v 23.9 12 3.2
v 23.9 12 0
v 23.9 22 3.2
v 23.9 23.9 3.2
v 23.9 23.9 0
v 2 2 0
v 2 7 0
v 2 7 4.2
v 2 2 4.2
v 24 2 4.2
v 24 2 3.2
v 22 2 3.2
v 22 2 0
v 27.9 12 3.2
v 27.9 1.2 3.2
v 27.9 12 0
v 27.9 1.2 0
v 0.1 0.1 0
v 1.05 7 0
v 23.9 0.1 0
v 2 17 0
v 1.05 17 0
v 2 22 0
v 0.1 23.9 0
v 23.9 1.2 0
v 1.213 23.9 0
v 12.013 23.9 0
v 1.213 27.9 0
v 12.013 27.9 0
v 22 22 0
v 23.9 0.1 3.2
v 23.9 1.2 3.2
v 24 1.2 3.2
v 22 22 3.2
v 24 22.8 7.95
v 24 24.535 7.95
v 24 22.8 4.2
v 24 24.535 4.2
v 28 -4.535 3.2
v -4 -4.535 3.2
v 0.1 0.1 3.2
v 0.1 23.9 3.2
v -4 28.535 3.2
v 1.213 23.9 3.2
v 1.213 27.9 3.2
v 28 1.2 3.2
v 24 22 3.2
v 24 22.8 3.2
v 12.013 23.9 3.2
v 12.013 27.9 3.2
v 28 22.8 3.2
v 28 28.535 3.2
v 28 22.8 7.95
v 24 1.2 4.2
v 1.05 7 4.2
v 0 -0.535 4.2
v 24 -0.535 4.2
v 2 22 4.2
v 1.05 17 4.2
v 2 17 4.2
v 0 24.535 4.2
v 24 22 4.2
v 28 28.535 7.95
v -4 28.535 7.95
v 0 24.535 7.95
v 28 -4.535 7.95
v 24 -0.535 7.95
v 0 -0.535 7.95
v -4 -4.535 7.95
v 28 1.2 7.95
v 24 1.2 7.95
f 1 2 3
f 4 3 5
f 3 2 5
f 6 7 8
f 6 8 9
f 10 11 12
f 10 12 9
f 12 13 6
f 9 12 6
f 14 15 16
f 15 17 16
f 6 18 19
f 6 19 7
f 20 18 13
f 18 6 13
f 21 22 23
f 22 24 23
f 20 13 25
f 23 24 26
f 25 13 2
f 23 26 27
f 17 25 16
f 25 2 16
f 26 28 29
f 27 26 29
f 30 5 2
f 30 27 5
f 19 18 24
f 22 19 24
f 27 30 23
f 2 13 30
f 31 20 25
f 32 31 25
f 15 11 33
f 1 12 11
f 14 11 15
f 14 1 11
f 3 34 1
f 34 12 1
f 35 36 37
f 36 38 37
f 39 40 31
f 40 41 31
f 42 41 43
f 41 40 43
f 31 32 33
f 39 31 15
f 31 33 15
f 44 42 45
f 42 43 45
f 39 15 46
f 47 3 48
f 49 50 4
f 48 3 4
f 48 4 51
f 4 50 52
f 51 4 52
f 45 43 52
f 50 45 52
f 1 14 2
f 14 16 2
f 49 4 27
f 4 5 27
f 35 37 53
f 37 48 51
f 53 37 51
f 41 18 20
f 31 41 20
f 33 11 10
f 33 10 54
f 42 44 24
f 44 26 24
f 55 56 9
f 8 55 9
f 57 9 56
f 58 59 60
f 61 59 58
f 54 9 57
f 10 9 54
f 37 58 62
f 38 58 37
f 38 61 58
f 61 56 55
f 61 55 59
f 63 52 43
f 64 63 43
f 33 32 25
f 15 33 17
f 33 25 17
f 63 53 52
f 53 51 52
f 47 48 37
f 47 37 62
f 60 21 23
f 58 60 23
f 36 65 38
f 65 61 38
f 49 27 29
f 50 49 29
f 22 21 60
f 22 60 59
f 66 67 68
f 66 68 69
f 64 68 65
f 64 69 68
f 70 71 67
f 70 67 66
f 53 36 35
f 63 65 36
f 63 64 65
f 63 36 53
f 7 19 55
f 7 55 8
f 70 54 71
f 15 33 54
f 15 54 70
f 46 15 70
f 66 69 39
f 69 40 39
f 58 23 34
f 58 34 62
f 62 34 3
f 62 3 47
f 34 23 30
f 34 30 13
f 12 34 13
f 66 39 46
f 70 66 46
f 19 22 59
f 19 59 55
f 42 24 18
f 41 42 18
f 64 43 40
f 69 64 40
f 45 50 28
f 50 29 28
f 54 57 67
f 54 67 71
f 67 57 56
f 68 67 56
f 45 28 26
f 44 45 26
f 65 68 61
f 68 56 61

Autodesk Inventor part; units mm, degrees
ref_plane "YZ Plane" through (0, 0, 0) normal (1, 0, 0) x (0, 1, 0)
ref_plane "XZ Plane" through (0, 0, 0) normal (0, 1, 0) x (-1, 0, 0)
ref_plane "XY Plane" through (0, 0, 0) normal (0, 0, 1) x (1, 0, 0)
sketch "Sketch1" plane through (0, 0, 0) normal (0, 0, 1) x (1, 0, 0)
  line L0 (0, 0) -> (0, 24) construction
  line L1 (0, 24) -> (1.113, 24) construction
  line L2 (1.113, 24) -> (1.113, 28) construction
  line L3 (1.113, 28) -> (12.113, 28) construction
  line L4 (12.113, 28) -> (12.113, 24) construction
  line L5 (12.113, 24) -> (24, 24) construction
  line L6 (24, 24) -> (24, 12.1) construction
  line L7 (24, 12.1) -> (28, 12.1) construction
  line L8 (28, 12.1) -> (28, 1.1) construction
  line L9 (28, 1.1) -> (24, 1.1) construction
  line L10 (24, 1.1) -> (24, 0) construction
  line L11 (24, 0) -> (0, 0) construction
  line L12 (12.013, 27.9) -> (1.213, 27.9)
  line L13 (1.213, 27.9) -> (1.213, 23.9)
  line L14 (1.213, 23.9) -> (0.1, 23.9)
  line L15 (0.1, 23.9) -> (0.1, 0.1)
  line L16 (0.1, 0.1) -> (23.9, 0.1)
  line L17 (23.9, 0.1) -> (23.9, 1.2)
  line L18 (23.9, 1.2) -> (27.9, 1.2)
  line L19 (27.9, 1.2) -> (27.9, 12)
  line L20 (27.9, 12) -> (23.9, 12)
  line L21 (23.9, 12) -> (23.9, 23.9)
  line L22 (23.9, 23.9) -> (12.013, 23.9)
  line L23 (12.013, 23.9) -> (12.013, 27.9)
  circle A0 centre (-1.945, 26.005) radius 1.548
  circle A1 centre (26.025, 26.005) radius 1.548
  circle A2 centre (-2.025, -2.005) radius 1.548
  circle A3 centre (26.025, -2.005) radius 1.548
  line L24 (0.1, 23.9) -> (23.9, 0.1) construction
  line L25 (23.9, 23.9) -> (0.1, 0.1) construction
  line L26 (-1.945, 26.005) -> (26.025, -2.005) construction
  line L27 (-2.025, -2.005) -> (26.025, 26.005) construction
  line L28 (2, 22) -> (22, 22)
  line L29 (22, 22) -> (22, 2)
  line L30 (22, 2) -> (2, 2)
  line L31 (2, 2) -> (2, 22) construction
  line L32 (2, 17) -> (1.05, 17)
  line L33 (1.05, 17) -> (1.05, 7)
  line L34 (1.05, 7) -> (2, 7)
  line L35 (2, 17) -> (2, 22)
  line L36 (2, 7) -> (2, 2)
  point P0 (12, 12)
  point P1 (1.05, 12)
  point P2 (12, 12)
  dimension "d0" = 24
  dimension "d1" = 1.113
  dimension "d2" = 4
  dimension "d3" = 11
  dimension "d4" = 11.887
  dimension "d5" = 11.9
  dimension "d6" = 4
  dimension "d7" = 11
  dimension "d8" = 1.1
  dimension "d9" = 0.1
  dimension "d10" = 3.096
  dimension "d11" = 27.97
  dimension "d12" = 28.01
  dimension "d15" = 20
  dimension "d16" = 0.95
  dimension "d17" = 10
extrude "Extrusion1" add sketch "Sketch1" along normal blind 3.2 contours L23 L22 L21 L20 L19 L18 L17 L16 L15 L14 L13 L12
sketch "Sketch2" plane through (0, 0, 3.2) normal (0, 0, 1) x (1, 0, 0)
  line L0 (0, 24.535) -> (24, 24.535)
  line L1 (24, 24.535) -> (24, -0.535) construction
  line L2 (24, -0.535) -> (0, -0.535)
  line L3 (0, -0.535) -> (0, 24.535)
  line L4 (22, 22) -> (22, 2) projected
  line L5 (1.3564, 23.1456) -> (22, 2) construction
  line L6 (22, 22) -> (2.0347, 2) construction
  line L7 (2, 22) -> (22, 22) projected
  line L8 (28, 28.535) -> (-4, 28.535)
  line L9 (-4, 28.535) -> (-4, -4.535)
  line L10 (-4, -4.535) -> (28, -4.535)
  line L11 (28, -4.535) -> (28, 28.535)
  line L12 (24, 1.2) -> (28, 1.2)
  line L13 (24, 22.8) -> (28, 22.8)
  line L14 (24, 24.535) -> (24, 22.8)
  line L15 (24, -0.535) -> (24, 1.2)
  line L16 (23.9, 0.1) -> (23.9, 1.2) projected
  point P0 (0, 0)
  point P1 (12, 24.535)
  point P2 (12, 22)
  point P3 (24, 12)
  point P4 (22, 12)
  dimension "d18" = 25.07
  dimension "d19" = 24
  dimension "d20" = 4
  dimension "d21" = 1.735
  dimension "d22" = 1.735
extrude "Extrusion2" add sketch "Sketch2" along normal blind 4.75 contours L3 L2 L15 L12 L11 L10 L9 L8 L13 L14 L0
sketch "Sketch3" plane through (0, 0, 3.2) normal (0, 0, 1) x (1, 0, 0)
  line L0 (28, 1.2) -> (24, 1.2) projected
  line L1 (24, 1.2) -> (24, -0.535) projected
  line L2 (24, -0.535) -> (0, -0.535) projected
  line L3 (0, -0.535) -> (0, 24.535) projected
  line L4 (0, 24.535) -> (24, 24.535) projected
  line L5 (24, 24.535) -> (24, 22.8) projected
  line L6 (24, 22.8) -> (28, 22.8) projected
  line L7 (28, 22.8) -> (28, 28.535) projected
  line L8 (28, 28.535) -> (-4, 28.535) projected
  line L9 (-4, 28.535) -> (-4, -4.535) projected
  line L10 (-4, -4.535) -> (28, -4.535) projected
  line L11 (28, -4.535) -> (28, 1.2) projected
  line L12 (12.013, 24.535) -> (1.213, 24.535) projected
  line L13 (1.213, 24.535) -> (1.213, 23.9) projected
  line L14 (1.213, 23.9) -> (0.1, 23.9) projected
  line L15 (0.1, 23.9) -> (0.1, 0.1) projected
  line L16 (0.1, 0.1) -> (23.9, 0.1) projected
  line L17 (23.9, 0.1) -> (23.9, 1.2) projected
  line L18 (23.9, 1.2) -> (24, 1.2) projected
  line L19 (24, 1.2) -> (27.9, 1.2) projected
  line L20 (27.9, 1.2) -> (27.9, 12) projected
  line L21 (27.9, 12) -> (23.9, 12) projected
  line L22 (23.9, 12) -> (23.9, 23.9) projected
  line L23 (23.9, 23.9) -> (12.013, 23.9) projected
  line L24 (12.013, 23.9) -> (12.013, 24.535) projected
  line L25 (22, 22) -> (22, 2) projected
  line L26 (22, 2) -> (2, 2) projected
  line L27 (2, 2) -> (2, 7) projected
  line L28 (2, 7) -> (1.05, 7) projected
  line L29 (1.05, 7) -> (1.05, 17) projected
  line L30 (1.05, 17) -> (2, 17) projected
  line L31 (2, 17) -> (2, 22) projected
  line L32 (2, 22) -> (22, 22) projected
  line L33 (0, 24.535) -> (1.213, 24.535) projected
  line L34 (0, 24.535) -> (24, 24.535)
  line L35 (24, 24.535) -> (24, 22.8) projected
  line L36 (2, 22) -> (22, 22) projected
  line L37 (12.013, 24.535) -> (24, 24.535) projected
  line L38 (24, 24.535) -> (24, 22)
  line L39 (2, 17) -> (2, 22) projected
  line L40 (24, 22) -> (2, 22)
  line L41 (2, 22) -> (2, 17)
  line L42 (1.05, 7) -> (1.05, 17) projected
  line L43 (2, 17) -> (1.05, 17)
  line L44 (1.05, 17) -> (1.05, 7)
  line L45 (2, 2) -> (2, 7) projected
  line L46 (1.05, 7) -> (2, 7)
  line L47 (2, 7) -> (2, 2)
  line L48 (2, 2) -> (24, 2)
  line L49 (24, 2) -> (24, 1.2)
  line L50 (24, 1.2) -> (24, -0.535) projected
  line L51 (24, 1.2) -> (24, -0.535)
  line L52 (24, -0.535) -> (0, -0.535)
  line L53 (0, -0.535) -> (0, 24.535) projected
  line L54 (0, 24.535) -> (0, -0.535)
  line L55 (24, -0.535) -> (0, -0.535) projected
  line L56 (0, -0.535) -> (24, -0.535)
  line L57 (24, -0.535) -> (24, 2)
  point P0 (0, 0)
  point P1 (23.9, 22)
extrude "Extrusion3" add sketch "Sketch3" along normal blind 1 contours L1 L2 L3 L4 L13 L14 L15 L16 L17 L18 | L18 L17 L16 L15 L14 L13 L4 L24 L23 L22 L40 L32 L31 L30 L29 L28 L27 L26 L48 L49 | L22 L23 L24 L4 L5 L38 L40
properties part number "Camera Mod"
